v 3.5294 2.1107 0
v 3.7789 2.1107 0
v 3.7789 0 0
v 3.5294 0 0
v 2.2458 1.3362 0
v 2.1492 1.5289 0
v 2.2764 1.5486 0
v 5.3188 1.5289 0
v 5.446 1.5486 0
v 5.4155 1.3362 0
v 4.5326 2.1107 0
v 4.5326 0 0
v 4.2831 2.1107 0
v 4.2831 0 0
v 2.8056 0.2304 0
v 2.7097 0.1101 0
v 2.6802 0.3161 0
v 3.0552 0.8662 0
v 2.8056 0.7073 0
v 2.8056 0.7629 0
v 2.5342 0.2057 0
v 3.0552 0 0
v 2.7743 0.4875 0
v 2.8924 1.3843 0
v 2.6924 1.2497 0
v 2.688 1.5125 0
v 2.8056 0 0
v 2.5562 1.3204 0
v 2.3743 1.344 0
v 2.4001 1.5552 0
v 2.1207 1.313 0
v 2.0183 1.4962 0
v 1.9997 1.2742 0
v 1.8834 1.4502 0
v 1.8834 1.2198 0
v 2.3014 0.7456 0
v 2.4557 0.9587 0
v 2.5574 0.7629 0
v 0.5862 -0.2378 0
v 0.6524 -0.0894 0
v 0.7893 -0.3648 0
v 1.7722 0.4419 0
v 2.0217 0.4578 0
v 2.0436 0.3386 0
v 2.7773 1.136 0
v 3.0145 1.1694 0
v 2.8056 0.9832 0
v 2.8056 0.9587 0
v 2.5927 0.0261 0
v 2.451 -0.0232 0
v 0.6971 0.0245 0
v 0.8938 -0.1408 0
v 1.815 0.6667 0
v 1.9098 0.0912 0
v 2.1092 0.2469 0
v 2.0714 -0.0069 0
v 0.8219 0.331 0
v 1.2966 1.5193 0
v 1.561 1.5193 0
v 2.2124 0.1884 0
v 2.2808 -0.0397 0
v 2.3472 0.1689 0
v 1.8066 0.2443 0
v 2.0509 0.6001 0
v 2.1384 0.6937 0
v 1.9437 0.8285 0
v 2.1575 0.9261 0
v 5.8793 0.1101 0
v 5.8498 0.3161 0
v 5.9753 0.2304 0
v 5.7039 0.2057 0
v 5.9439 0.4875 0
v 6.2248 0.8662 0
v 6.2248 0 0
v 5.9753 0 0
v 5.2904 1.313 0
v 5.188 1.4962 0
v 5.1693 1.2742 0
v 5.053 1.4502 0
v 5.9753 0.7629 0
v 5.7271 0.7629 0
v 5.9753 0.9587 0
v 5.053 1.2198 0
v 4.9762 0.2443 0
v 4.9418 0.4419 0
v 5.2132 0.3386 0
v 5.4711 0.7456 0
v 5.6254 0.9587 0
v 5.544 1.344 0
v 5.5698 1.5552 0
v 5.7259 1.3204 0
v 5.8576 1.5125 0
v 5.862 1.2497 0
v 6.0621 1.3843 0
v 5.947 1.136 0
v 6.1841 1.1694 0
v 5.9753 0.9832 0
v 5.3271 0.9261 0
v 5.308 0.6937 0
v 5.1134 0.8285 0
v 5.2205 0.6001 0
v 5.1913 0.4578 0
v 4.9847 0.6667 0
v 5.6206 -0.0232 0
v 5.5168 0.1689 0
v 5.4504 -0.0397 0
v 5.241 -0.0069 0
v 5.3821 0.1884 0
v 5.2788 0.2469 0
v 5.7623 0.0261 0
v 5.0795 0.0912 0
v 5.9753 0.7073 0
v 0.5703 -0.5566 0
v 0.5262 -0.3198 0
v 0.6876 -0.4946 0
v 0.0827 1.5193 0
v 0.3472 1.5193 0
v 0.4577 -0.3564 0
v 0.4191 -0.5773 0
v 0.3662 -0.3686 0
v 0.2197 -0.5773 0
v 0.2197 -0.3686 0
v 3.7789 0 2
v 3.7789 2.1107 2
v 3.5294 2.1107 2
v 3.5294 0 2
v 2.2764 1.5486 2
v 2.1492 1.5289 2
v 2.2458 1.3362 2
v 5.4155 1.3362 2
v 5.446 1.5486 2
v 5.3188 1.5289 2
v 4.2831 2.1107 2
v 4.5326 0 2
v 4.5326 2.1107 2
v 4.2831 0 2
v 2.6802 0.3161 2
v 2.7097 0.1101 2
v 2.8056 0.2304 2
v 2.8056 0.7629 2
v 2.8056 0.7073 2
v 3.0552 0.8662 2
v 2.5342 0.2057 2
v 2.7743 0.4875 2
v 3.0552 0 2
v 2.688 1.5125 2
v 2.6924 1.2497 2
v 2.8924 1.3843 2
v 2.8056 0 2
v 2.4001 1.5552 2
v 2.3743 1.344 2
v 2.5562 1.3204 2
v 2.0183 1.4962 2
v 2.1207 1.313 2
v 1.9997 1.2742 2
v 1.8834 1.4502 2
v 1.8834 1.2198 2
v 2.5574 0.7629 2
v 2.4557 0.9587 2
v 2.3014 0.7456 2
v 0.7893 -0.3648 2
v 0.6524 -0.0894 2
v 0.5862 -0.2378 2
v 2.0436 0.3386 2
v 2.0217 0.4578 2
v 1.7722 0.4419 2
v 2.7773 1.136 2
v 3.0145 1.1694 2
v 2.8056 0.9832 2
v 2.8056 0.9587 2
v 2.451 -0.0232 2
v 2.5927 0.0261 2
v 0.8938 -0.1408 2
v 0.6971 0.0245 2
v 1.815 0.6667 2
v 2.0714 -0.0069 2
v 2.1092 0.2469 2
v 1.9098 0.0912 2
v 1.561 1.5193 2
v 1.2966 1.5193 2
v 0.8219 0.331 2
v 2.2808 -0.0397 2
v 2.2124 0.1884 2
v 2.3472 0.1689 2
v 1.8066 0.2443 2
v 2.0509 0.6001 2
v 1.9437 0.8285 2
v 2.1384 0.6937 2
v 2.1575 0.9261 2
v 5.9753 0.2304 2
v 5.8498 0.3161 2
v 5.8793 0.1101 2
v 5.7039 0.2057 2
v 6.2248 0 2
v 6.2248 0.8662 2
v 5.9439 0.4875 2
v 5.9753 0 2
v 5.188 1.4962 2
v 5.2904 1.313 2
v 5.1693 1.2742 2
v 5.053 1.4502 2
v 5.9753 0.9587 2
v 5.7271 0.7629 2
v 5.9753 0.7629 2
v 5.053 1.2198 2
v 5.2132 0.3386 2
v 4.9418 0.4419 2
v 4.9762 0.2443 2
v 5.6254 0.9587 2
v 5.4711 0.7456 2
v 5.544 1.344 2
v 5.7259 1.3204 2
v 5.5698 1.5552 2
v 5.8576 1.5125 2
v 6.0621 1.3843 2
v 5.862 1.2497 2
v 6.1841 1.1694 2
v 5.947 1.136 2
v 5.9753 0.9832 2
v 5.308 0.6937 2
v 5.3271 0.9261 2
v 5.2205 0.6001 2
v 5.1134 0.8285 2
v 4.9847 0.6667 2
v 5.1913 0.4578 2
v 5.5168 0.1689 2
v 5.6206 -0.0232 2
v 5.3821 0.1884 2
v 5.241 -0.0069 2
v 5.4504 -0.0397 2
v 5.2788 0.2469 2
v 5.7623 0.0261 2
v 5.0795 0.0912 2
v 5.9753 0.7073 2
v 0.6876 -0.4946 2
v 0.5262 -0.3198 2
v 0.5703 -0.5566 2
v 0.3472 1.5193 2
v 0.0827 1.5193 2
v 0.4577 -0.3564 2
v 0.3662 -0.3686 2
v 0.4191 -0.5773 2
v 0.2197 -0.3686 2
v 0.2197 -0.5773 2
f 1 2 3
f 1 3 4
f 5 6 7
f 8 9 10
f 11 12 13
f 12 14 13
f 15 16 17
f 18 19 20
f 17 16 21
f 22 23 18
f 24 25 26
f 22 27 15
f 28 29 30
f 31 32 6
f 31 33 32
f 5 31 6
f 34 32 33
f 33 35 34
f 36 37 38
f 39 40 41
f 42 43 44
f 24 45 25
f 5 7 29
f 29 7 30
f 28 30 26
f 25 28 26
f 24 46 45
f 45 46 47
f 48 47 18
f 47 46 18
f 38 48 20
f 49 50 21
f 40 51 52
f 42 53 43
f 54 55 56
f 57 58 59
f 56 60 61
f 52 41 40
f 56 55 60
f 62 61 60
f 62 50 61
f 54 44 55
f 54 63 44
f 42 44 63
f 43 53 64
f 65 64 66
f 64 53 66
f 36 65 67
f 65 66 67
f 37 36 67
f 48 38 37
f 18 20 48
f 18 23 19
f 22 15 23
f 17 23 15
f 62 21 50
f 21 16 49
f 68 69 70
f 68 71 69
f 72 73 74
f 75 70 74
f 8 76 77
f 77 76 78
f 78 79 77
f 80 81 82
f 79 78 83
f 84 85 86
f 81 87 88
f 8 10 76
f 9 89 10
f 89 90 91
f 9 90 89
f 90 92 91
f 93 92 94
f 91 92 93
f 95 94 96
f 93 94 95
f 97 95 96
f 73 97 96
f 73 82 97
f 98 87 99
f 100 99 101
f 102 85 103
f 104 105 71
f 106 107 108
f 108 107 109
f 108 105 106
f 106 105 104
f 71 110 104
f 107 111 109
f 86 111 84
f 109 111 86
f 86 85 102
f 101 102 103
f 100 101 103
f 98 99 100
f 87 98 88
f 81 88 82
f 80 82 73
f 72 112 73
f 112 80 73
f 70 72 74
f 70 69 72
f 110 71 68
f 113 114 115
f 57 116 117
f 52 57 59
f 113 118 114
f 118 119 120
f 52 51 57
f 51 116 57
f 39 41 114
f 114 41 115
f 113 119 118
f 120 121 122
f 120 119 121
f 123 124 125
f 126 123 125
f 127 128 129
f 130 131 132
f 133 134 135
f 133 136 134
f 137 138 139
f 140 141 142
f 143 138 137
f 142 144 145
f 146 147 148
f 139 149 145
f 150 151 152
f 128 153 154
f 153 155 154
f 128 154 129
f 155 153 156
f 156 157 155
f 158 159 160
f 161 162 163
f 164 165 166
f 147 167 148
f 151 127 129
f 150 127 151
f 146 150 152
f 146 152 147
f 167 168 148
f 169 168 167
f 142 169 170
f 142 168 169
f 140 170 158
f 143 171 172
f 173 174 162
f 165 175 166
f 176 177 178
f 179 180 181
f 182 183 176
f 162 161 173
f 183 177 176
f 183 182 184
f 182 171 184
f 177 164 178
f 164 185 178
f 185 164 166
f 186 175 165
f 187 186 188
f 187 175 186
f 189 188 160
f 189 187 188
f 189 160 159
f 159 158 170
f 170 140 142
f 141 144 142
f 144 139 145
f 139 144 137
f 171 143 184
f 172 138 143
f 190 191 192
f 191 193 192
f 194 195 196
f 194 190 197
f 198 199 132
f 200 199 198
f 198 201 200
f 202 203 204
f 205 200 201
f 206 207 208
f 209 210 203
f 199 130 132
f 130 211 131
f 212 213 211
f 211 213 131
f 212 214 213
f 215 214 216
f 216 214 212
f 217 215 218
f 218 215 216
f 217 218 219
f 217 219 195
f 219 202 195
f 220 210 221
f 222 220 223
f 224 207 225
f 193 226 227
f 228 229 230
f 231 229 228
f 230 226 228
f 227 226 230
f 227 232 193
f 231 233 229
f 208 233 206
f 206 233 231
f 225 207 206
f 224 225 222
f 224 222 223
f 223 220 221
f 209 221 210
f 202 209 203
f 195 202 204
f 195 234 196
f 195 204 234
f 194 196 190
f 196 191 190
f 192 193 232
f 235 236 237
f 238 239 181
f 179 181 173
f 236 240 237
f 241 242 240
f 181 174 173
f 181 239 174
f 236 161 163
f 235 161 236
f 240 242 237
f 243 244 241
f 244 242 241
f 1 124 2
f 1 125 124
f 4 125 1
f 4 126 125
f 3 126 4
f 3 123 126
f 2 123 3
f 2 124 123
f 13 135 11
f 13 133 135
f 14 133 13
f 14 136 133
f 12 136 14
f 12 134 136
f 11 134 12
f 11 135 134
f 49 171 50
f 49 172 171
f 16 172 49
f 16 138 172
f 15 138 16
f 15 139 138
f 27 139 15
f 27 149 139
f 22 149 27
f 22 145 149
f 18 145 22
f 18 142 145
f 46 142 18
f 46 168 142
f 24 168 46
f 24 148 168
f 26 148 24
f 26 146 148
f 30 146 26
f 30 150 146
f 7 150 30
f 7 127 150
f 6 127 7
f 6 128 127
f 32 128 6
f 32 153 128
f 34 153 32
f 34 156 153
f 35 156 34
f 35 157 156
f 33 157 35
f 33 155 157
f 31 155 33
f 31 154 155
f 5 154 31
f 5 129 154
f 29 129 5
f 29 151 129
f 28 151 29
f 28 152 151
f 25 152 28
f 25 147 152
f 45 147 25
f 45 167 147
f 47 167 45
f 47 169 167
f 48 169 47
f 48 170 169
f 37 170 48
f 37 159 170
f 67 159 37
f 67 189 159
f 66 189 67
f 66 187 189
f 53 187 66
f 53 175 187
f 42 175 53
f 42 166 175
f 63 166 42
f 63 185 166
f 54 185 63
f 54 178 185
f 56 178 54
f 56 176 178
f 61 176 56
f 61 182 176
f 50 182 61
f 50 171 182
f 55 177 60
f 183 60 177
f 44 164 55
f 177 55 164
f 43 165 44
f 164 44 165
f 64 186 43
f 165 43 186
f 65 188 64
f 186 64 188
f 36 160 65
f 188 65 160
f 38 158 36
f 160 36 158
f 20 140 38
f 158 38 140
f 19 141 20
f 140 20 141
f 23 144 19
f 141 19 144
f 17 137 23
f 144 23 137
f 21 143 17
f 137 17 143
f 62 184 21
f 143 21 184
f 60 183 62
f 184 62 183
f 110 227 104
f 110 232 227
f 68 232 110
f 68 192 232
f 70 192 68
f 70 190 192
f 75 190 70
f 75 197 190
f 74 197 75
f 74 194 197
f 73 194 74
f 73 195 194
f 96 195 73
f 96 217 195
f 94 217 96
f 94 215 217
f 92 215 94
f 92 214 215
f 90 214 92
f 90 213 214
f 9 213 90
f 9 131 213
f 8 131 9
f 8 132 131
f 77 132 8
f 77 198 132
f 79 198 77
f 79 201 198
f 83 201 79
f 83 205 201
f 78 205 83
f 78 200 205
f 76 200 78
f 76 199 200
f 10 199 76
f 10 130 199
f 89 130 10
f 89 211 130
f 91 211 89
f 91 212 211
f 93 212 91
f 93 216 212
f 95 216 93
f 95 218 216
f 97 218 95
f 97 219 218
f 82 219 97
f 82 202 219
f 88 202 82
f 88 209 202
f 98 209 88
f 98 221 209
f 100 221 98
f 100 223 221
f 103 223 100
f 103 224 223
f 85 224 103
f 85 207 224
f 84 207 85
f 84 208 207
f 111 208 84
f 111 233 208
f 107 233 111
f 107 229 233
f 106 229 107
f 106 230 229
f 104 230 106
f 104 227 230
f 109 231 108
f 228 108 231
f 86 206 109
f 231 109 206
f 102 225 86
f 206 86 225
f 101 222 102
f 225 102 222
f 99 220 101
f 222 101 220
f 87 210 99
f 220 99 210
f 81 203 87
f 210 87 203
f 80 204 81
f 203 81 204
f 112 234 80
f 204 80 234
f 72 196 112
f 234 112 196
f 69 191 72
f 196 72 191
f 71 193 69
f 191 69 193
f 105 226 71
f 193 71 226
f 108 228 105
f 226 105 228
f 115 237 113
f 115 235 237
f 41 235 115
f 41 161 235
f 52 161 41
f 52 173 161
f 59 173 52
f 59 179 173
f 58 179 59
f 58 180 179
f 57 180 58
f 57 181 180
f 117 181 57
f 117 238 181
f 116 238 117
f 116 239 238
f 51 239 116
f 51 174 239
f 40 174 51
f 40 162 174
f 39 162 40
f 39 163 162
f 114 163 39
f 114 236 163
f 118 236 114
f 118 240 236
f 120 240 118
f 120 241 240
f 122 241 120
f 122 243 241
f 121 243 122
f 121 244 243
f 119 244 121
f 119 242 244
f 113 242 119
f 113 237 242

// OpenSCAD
texte_a_inserer = "yalla"; 
taille = 2; 
police = "DejaVuSans"; //[[Abril Fatface,Aclonica,Acme,Advent Pro,Akronim,Aladin,Alegreya,Alegreya Sans,Alegreya SC,Alex Brush,Alfa Slab One,Alice,Amaranth,Architects Daughter,Archivo Black,Archivo Narrow,Arimo,Arvo,Asap,Astloch,Asul,Averia Libre,Averia Serif Libre,Bangers,Basic,Belgrano,Berkshire Swash,Bigshot One,Bilbo Swash Caps,Black Ops One,Bonbon,Bowlby One SC,Brawler,Bubblegum Sans,Butterfly Kids,Cabin Condensed,Caesar Dressing,Cagliostro,Calligraffitti,Capriola,Carter One,Changa One,Chango,Chelsea Market,Cherry Cream Soda,Chewy,Chicle,Chivo,Clicker Script,Coming Soon,Concert One,Condiment,Cookie,Courgette,Covered By Your Grace,Crimson Text,Dancing Script,DejaVu Sans,DejaVu Serif,Dhurjati,Doppio One,Dosis,Droid Sans,Eagle Lake,Electrolize,Emilys Candy,Encode Sans,Encode Sans Compressed,Euphoria Script,Exo,Exo 2,Faster One,Federo,Finger Paint,Fjord One,Fontdiner Swanky,Freckle Face,Fruktur,Gabriela,Geo,Germania One,Give You Glory,Gloria Hallelujah,Goudy Bookletter 1911,Graduate,Grand Hotel,Great Vibes,Griffy,Hanalei Fill,Happy Monkey,Henny Penny,Hind,IM Fell English SC,Indie Flower,Irish Grover,Italianno,Jacques Francois Shadow,Jolly Lodger,Josefin Slab,Joti One,Judson,Just Another Hand,Kalam,Kameron,Karma,Kavoon,Knewave,Kranky,Kristi,Laila,Lakki Reddy,Lancelot,Lato,Leckerli One,Ledger,Lekton,Lemon One,Liberation Sans,Libre Caslon Text,Life Savers,Lilita One,Lily Script One,Limelight,Lobster,Lobster Two,Londrina Outline,Londrina Shadow,Londrina Solid,Lora,Love Ya Like A Sister,Loved by the King,Lovers Quarrel,Luckiest Guy,Lusitana,Macondo,Macondo Swash Caps,Mako,Marck Script,Margarine,Marko One,Maven Pro,McLaren,MedievalSharp,Merienda One,Merriweather,Mervale Script,Metal Mania,Metrophobic,Milonga,Miltonian Tattoo,Miss Fajardose,Molle,Montez,Montserrat,Mr De Haviland,Mystery Quest,Neucha,New Rocker,Niconne,Nosifer,Nothing You Could Do,Noto Sans Oriya,Noto Serif,Nova Square,Nunito,Old Standard TT,Oleo Script,Oleo Script Swash Caps,Orbitron,Oregano,Orienta,Original Surfer,Oswald,Over the Rainbow,Overlock,Oxygen,Pacifico,Paprika,Parisienne,Patrick Hand SC,Paytone One,Peralta,Permanent Marker,Piedra,Pirata One,Play,Playball,Poetsen One,Poppins,Press Start 2P,Princess Sofia,PT Mono,Qwigley,Racing Sans One,Raleway,Rancho,Ranga,Ribeye,Roboto,Roboto Condensed,Roboto Slab,Rochester,Rock Salt,Rubik One,Sail,Salsa,Sansita One,Sarina,Satisfy,Schoolbell,Seaweed Script,Sevillana,Shadows Into Light,Shadows Into Light Two,Share,Six Caps,Skranji,Source Sans Pro,Spicy Rice,Stardos Stencil,Stoke,Syncopate,Teko,Terminal Dosis,The Girl Next Door,Tillana,Timmana,Titillium Web,Ubuntu,Ultra,Underdog,UnifrakturCook,UnifrakturMaguntia,Vampiro One,Vidaloka,Viga,Voces,Volkhov,Vollkorn,Voltaire,Waiting for the Sunrise,Wallpoet,Wellfleet,Wendy One,Yellowtail,Yesteryear,Zeyada]]
hauteur = 2; 
module rendu(){
linear_extrude(hauteur) text(texte_a_inserer,size = taille, font = police);
}
rendu();
 
